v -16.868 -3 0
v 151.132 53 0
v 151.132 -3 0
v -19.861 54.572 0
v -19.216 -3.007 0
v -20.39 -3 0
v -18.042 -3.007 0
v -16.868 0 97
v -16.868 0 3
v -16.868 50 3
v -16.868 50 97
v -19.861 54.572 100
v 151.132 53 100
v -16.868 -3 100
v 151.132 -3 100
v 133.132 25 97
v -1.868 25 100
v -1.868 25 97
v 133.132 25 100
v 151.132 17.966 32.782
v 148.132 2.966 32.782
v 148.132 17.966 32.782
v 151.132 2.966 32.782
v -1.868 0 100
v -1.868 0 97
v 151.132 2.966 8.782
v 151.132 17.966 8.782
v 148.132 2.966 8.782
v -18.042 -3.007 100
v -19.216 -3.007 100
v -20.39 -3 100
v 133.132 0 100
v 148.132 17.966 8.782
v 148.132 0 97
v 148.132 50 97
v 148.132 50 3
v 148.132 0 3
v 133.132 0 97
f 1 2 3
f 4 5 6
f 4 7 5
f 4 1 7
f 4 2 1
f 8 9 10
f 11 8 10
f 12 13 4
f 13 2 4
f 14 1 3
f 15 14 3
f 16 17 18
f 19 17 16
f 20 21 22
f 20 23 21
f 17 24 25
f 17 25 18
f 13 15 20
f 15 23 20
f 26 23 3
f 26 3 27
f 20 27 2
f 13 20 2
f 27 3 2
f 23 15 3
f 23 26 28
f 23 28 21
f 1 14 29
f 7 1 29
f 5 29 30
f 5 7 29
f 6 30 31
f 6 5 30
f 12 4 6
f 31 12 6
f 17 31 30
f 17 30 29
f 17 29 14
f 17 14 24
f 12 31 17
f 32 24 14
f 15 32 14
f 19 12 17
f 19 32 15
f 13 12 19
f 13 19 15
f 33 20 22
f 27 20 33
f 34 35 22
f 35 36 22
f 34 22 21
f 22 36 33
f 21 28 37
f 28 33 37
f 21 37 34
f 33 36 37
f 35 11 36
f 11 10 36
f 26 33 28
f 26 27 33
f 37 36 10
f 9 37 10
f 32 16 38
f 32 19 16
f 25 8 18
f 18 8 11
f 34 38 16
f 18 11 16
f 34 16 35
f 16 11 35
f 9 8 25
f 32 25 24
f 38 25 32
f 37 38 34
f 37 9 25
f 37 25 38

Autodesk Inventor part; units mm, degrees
ref_plane "YZ Plane" through (0, 0, 0) normal (1, 0, 0) x (0, 1, 0)
ref_plane "XZ Plane" through (0, 0, 0) normal (0, 1, 0) x (-1, 0, 0)
ref_plane "XY Plane" through (0, 0, 0) normal (0, 0, 1) x (1, 0, 0)
sketch "Sketch1" plane through (0, 0, 0) normal (0, 0, 1) x (1, 0, 0)
  line L0 (-16.8678, 0) -> (148.1322, 0)
  line L1 (-16.8678, 0) -> (-16.8678, 50)
  line L2 (-16.8678, 50) -> (148.1322, 50)
  line L3 (148.1322, 50) -> (148.1322, 0)
  line L4 (-16.8678, 0) -> (-16.8678, -3)
  line L5 (-16.8678, -3) -> (151.1322, -3)
  line L6 (151.1322, -3) -> (151.1322, 50)
  line L7 (151.1322, 50) -> (151.1322, 53)
  line L8 (151.1322, 53) -> (-19.8606, 54.5715)
  line L9 (-19.8606, 54.5715) -> (-20.3897, -3)
  arc A0 (-20.3897, -3) -> (-16.8678, -3) centre (-18.6288, 188.6018) ccw
  point P0 (0, 0)
  dimension "d0" = 165
  dimension "d2" = 50
  dimension "d3" = 165
  dimension "d4" = 3
  dimension "d5" = 168
  dimension "d6" = 53
  dimension "d7" = 3
  dimension "d8" = 171
extrude "Extrusion1" add sketch "Sketch1" along normal blind 100
sketch "Sketch2" plane through (0, 0, 100) normal (0, 0, 1) x (1, 0, 0)
  line L0 (148.1322, 0) -> (-16.8678, 0) projected
  line L1 (-16.8678, 0) -> (-1.8678, 0)
  line L2 (-1.8678, 0) -> (-1.8678, 3.4426)
  line L3 (-1.8678, 0) -> (-1.8678, 25)
  line L4 (-1.8678, 25) -> (133.1322, 25)
  line L5 (133.1322, 25) -> (133.1322, 0)
  line L6 (-16.8678, 0) -> (-16.8678, 50)
  line L7 (-16.8678, 50) -> (148.1322, 50)
  line L8 (148.1322, 50) -> (148.1322, 0)
  line L9 (148.1322, 0) -> (133.1322, 0)
  point P0 (0, 0)
  dimension "d11" = 15
  dimension "d12" = 25
  dimension "d13" = 135
  dimension "d14" = 50
  dimension "d15" = 165
  dimension "d16" = 50
extrude "Extrusion2" add sketch "Sketch2" against normal blind 3 contours L0 L5 L4 L3 L2 L6 L7 L8
sketch "Sketch3" plane through (0, 0, 0) normal (0, 0, -1) x (-1, 0, 0)
  line L0 (-148.1322, 0) -> (16.8678, 0) projected
  line L1 (-148.1322, 0) -> (16.8678, 0)
  line L2 (16.8678, 0) -> (16.8678, 50)
  line L3 (16.8678, 50) -> (-148.1322, 50)
  line L4 (-148.1322, 50) -> (-148.1322, 0)
  point P0 (0, 0)
  dimension "d19" = 165
  dimension "d20" = 50
  dimension "d21" = 165
extrude "Extrusion3" add sketch "Sketch3" against normal blind 3
sketch "Sketch4" plane through (151.1322, -3, 0) normal (1, 0, 0) x (0, 0, -1)
  line L0 (-32.782, 20.9659) -> (-8.782, 20.9659)
  line L1 (-8.782, 20.9659) -> (-8.782, 5.9659)
  line L2 (-8.782, 5.9659) -> (-32.782, 5.9659)
  line L3 (-32.782, 5.9659) -> (-32.782, 20.9659)
  point P0 (0, 3)
  dimension "d24" = 24
  dimension "d25" = 15
extrude "Extrusion4" cut sketch "Sketch4" against normal blind 3
properties part number "Main"
